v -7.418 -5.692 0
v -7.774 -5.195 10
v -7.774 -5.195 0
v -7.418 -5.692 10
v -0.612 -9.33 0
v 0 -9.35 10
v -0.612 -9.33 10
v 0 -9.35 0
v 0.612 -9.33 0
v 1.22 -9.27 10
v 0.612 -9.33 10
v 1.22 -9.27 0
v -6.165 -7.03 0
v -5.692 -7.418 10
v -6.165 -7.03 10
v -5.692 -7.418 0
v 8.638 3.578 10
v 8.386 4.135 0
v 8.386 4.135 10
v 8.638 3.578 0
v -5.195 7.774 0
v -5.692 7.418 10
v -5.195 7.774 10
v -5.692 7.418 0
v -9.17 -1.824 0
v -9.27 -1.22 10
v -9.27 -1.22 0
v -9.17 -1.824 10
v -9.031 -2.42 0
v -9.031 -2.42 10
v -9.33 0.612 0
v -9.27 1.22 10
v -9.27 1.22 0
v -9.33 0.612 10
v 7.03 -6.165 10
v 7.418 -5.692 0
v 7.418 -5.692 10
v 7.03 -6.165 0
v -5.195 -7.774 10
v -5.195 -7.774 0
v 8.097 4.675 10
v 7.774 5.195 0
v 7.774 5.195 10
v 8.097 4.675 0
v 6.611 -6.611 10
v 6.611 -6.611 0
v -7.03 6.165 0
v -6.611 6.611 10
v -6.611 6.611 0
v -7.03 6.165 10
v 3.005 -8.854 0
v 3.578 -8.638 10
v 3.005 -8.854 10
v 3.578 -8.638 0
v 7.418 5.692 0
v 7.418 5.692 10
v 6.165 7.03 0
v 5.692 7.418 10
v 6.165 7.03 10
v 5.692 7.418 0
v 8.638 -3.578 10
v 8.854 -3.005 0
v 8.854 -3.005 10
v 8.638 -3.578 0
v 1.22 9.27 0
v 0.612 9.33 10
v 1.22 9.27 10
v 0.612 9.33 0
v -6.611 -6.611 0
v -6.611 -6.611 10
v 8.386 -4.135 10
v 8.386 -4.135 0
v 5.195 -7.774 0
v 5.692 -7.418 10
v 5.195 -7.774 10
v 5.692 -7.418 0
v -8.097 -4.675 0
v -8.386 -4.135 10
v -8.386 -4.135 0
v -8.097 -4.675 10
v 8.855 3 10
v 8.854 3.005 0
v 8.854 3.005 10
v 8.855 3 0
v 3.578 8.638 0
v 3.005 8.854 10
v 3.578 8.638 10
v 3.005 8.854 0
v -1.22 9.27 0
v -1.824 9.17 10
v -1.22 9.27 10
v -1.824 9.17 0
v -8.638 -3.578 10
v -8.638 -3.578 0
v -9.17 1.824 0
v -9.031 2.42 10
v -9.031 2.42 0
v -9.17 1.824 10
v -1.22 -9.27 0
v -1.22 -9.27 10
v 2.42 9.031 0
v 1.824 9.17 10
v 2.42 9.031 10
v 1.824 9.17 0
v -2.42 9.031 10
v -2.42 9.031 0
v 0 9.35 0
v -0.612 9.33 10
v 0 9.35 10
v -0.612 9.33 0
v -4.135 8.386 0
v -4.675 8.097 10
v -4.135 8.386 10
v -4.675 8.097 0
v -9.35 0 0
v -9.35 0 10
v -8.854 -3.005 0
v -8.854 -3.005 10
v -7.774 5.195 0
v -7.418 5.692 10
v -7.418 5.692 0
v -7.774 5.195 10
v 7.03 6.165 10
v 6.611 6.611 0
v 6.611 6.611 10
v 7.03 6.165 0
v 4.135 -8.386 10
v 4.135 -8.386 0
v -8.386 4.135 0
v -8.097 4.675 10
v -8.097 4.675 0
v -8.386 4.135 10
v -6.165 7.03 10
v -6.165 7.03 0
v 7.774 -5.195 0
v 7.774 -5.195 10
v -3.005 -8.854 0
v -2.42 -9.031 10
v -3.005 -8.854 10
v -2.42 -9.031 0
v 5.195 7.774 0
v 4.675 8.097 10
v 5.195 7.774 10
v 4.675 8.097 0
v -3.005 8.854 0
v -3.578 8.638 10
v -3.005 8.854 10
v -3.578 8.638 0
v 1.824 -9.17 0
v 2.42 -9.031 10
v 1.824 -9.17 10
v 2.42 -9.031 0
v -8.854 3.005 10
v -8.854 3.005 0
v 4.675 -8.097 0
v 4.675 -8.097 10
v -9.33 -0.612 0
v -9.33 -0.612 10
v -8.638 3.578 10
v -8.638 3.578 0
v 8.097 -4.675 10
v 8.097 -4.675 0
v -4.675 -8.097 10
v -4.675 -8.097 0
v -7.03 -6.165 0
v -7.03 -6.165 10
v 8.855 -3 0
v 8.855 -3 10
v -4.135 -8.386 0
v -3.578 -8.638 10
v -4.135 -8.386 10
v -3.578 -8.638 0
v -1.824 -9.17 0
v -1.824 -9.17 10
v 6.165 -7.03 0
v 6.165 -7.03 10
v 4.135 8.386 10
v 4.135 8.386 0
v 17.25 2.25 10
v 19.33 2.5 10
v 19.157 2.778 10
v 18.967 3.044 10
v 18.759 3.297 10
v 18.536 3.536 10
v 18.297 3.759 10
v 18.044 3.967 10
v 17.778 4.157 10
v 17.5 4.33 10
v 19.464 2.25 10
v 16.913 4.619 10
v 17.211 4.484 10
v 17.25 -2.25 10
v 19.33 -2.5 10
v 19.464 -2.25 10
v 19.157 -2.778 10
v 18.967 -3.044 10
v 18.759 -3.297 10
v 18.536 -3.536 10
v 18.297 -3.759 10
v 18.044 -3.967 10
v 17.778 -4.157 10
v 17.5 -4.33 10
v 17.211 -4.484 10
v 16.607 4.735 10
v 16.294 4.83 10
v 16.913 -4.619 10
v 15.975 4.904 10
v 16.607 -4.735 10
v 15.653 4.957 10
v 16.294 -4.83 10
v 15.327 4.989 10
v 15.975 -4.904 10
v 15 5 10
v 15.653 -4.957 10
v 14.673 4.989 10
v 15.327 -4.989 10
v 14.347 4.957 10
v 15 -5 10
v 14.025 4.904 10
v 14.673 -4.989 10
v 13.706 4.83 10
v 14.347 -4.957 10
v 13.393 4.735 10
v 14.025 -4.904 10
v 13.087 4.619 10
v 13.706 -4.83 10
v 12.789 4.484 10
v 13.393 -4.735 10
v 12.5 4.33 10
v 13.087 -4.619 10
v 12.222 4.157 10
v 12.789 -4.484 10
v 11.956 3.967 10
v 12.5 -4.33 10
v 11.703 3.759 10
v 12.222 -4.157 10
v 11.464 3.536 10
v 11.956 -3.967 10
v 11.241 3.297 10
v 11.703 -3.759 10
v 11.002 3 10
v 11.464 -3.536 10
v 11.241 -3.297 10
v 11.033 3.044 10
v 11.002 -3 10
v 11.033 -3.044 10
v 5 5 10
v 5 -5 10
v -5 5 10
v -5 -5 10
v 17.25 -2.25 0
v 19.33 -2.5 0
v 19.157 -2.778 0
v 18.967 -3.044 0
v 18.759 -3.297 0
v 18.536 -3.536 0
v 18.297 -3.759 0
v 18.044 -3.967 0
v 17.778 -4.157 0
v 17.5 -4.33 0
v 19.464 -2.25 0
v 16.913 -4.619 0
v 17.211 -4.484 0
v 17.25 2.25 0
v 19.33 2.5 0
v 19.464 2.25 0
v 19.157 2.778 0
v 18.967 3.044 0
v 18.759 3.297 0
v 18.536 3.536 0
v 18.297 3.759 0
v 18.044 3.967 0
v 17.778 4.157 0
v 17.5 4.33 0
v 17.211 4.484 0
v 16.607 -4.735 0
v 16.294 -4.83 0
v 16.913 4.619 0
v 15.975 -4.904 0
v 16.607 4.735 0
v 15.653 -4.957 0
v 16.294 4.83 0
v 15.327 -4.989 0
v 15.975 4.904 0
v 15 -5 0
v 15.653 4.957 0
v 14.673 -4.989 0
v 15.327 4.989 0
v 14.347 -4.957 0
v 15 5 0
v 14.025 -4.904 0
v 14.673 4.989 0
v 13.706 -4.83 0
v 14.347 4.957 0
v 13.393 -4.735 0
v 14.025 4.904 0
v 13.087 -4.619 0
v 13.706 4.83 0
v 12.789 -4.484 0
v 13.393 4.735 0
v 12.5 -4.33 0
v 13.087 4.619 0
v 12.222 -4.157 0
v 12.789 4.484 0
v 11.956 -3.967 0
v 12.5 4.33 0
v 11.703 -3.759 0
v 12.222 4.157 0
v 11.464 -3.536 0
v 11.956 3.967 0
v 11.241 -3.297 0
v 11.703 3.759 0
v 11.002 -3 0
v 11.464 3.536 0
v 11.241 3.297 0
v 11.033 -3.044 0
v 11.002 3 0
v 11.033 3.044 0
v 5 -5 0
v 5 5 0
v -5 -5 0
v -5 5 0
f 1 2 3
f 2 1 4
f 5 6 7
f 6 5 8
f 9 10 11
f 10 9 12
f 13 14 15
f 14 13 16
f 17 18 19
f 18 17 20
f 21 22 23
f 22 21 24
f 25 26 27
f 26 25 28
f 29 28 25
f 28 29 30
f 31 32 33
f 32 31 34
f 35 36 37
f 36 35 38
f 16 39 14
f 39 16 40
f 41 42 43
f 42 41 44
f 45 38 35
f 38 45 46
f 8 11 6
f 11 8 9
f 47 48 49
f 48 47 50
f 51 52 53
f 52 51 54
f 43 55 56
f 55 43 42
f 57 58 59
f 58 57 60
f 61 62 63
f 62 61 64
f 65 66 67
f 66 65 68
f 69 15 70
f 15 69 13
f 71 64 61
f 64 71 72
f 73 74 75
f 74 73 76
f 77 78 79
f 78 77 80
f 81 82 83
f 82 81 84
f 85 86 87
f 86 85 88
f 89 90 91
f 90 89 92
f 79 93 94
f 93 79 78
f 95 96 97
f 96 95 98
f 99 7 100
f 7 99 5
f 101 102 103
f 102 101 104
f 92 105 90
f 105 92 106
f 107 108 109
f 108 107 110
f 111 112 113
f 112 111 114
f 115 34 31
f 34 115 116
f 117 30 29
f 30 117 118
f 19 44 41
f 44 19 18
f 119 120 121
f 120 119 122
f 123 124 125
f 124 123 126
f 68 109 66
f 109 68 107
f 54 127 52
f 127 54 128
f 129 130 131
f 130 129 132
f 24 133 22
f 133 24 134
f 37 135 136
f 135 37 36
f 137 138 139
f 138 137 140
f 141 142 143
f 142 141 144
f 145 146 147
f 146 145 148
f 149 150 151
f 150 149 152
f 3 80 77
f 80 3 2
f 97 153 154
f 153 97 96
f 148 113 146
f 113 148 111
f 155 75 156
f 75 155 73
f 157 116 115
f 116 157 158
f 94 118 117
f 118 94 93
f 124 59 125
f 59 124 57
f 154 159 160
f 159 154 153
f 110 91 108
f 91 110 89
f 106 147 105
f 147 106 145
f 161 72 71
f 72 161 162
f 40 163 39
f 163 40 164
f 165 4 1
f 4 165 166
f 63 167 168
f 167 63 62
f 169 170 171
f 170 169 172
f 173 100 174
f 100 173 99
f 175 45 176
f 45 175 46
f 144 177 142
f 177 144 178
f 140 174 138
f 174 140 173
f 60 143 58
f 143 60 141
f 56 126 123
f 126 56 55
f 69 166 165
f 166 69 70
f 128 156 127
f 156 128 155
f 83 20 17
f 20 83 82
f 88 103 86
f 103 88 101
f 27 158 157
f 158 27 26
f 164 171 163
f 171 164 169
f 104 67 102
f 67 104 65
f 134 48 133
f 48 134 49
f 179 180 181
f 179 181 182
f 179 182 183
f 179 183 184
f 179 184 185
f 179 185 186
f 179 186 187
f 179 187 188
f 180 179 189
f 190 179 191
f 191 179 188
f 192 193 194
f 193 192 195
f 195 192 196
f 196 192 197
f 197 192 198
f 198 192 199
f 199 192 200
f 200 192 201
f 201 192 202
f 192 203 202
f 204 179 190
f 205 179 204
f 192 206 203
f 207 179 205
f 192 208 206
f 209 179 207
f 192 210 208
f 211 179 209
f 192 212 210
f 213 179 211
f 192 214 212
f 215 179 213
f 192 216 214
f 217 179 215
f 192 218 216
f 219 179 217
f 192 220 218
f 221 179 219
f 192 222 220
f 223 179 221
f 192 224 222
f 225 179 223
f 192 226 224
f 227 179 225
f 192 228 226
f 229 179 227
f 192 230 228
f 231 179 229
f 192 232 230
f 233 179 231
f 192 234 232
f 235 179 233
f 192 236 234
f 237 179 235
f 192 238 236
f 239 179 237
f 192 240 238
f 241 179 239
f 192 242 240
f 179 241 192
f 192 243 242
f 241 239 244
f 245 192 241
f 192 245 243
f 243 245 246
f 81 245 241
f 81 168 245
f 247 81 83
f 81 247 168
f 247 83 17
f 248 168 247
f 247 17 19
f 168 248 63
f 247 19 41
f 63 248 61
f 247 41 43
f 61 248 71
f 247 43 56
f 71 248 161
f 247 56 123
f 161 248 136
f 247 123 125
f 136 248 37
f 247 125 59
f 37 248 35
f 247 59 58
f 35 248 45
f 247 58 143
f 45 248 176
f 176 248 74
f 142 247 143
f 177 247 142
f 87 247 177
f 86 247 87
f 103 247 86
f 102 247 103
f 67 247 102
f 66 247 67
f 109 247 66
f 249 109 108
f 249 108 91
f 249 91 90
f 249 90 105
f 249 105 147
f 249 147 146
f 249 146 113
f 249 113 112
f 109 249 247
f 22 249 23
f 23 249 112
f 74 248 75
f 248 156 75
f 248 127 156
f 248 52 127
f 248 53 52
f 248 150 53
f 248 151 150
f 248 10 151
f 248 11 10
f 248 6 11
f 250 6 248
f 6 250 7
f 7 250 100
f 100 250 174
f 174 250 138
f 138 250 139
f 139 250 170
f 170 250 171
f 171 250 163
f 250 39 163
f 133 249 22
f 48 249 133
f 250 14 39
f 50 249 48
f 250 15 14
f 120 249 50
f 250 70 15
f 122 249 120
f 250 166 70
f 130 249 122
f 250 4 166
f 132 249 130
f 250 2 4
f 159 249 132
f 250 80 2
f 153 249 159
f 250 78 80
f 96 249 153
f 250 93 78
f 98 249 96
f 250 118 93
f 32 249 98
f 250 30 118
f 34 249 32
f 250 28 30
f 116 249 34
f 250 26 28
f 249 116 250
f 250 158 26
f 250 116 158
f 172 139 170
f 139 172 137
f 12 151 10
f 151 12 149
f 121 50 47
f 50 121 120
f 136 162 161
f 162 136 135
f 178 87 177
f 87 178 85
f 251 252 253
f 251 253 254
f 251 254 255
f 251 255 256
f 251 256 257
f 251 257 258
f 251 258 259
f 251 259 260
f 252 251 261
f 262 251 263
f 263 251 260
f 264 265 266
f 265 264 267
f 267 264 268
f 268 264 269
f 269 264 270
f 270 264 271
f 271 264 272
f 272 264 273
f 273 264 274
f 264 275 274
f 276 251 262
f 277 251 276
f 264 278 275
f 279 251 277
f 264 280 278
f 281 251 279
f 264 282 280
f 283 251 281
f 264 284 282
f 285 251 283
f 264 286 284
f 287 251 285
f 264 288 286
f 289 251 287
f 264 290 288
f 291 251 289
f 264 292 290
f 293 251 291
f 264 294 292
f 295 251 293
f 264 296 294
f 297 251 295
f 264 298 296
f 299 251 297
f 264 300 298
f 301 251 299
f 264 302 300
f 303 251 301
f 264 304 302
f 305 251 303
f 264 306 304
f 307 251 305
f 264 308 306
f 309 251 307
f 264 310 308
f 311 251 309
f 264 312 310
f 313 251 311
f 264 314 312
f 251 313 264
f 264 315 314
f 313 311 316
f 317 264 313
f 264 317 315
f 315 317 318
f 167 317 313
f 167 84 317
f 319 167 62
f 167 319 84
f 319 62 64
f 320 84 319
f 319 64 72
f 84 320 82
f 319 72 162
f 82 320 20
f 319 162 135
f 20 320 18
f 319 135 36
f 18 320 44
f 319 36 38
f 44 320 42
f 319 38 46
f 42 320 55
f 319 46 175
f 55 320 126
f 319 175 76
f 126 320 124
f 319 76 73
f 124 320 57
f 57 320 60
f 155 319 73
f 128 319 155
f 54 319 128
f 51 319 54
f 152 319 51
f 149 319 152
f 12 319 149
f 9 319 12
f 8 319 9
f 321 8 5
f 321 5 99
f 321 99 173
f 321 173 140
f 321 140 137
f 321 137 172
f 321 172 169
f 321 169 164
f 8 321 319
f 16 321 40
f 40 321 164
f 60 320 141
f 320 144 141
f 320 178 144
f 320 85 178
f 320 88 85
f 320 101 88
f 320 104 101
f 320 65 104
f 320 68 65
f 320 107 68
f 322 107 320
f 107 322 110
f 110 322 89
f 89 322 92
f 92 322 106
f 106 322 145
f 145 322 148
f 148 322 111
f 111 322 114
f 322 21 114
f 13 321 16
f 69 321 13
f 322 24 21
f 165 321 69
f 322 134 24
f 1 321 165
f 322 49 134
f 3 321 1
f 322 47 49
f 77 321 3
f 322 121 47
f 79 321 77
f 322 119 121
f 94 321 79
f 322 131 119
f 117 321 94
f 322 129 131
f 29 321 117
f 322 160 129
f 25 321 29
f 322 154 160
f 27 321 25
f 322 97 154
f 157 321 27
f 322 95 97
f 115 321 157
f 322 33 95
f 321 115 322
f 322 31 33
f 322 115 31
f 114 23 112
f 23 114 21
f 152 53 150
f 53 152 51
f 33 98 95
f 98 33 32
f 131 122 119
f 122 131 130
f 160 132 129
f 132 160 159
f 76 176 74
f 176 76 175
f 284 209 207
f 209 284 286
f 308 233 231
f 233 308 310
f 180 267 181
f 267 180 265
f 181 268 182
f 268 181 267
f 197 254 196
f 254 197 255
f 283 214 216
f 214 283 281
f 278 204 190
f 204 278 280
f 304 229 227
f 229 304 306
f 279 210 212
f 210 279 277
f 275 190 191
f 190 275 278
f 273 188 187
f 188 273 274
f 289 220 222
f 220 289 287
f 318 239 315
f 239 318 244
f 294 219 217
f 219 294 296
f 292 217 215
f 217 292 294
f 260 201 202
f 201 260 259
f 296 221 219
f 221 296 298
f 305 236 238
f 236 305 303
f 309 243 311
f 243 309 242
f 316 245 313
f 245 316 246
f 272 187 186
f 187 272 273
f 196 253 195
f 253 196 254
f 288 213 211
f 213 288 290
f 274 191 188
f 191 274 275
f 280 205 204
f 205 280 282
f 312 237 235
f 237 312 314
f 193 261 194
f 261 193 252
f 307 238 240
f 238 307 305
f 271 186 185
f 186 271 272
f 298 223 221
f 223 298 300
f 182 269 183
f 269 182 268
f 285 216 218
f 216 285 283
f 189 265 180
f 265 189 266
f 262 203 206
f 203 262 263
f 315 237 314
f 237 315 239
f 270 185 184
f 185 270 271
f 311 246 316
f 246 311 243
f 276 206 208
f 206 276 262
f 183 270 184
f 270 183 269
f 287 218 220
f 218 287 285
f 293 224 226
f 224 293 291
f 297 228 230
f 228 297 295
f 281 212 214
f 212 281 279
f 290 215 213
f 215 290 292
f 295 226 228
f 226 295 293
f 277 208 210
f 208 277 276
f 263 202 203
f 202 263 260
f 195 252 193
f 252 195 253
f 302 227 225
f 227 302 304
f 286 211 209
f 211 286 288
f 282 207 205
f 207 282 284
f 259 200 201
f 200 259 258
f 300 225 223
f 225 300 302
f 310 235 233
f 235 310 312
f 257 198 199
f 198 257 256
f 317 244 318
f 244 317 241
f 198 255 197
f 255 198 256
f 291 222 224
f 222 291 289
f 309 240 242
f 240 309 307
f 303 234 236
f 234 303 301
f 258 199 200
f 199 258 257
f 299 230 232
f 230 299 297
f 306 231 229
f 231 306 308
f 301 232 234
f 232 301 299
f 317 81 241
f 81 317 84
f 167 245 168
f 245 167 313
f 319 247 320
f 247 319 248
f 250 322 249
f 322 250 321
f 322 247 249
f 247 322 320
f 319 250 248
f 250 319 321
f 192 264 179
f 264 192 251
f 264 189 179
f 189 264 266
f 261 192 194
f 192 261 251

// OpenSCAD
// Tubing clip for 12.7 mm lab stand rod
// Print orientation: flat on bed, extrusion along +Z

// ---- Stand rod ring ----
stand_id   = 12.7;   // stand rod inner diameter
stand_wall = 3;      // stand ring wall thickness
stand_od   = stand_id + 2 * stand_wall;  // 18.7 mm outer diameter
stand_open = 10;     // width of -X side opening

// ---- Tubing ring ----
tube_id    = 6;      // tubing inner diameter
tube_wall  = 2;      // tubing wall thickness
tube_od    = tube_id + 2 * tube_wall;    // 10 mm outer diameter
tube_x     = 15;     // ring centre X
tube_open  = 4.5;    // width of +X side opening

// ---- Bridge ----
bridge_w   = 6;      // bridge width in Y
bridge_x0  = 8;      // bridge start X
bridge_x1  = 12;     // bridge end X

// ---- Misc ----
eps        = 0.5;    // cutter overshoot
$fn        = 96;

difference() {
    union() {
        // Stand ring
        cylinder(d = stand_od, h = 10);
        // Tubing ring
        translate([tube_x, 0, 0])
            cylinder(d = tube_od, h = 10);
        // Bridge
        translate([bridge_x0, -bridge_w / 2, 0])
            cube([bridge_x1 - bridge_x0, bridge_w, 10]);
    }
    // Stand rod opening
    translate([-stand_open / 2, -stand_open / 2, -eps])
        cube([stand_open, stand_open, 10 + 2 * eps]);
    // Tubing opening
    translate([tube_x + tube_open / 2, -tube_open / 2, -eps])
        cube([tube_open, tube_open, 10 + 2 * eps]);
}
